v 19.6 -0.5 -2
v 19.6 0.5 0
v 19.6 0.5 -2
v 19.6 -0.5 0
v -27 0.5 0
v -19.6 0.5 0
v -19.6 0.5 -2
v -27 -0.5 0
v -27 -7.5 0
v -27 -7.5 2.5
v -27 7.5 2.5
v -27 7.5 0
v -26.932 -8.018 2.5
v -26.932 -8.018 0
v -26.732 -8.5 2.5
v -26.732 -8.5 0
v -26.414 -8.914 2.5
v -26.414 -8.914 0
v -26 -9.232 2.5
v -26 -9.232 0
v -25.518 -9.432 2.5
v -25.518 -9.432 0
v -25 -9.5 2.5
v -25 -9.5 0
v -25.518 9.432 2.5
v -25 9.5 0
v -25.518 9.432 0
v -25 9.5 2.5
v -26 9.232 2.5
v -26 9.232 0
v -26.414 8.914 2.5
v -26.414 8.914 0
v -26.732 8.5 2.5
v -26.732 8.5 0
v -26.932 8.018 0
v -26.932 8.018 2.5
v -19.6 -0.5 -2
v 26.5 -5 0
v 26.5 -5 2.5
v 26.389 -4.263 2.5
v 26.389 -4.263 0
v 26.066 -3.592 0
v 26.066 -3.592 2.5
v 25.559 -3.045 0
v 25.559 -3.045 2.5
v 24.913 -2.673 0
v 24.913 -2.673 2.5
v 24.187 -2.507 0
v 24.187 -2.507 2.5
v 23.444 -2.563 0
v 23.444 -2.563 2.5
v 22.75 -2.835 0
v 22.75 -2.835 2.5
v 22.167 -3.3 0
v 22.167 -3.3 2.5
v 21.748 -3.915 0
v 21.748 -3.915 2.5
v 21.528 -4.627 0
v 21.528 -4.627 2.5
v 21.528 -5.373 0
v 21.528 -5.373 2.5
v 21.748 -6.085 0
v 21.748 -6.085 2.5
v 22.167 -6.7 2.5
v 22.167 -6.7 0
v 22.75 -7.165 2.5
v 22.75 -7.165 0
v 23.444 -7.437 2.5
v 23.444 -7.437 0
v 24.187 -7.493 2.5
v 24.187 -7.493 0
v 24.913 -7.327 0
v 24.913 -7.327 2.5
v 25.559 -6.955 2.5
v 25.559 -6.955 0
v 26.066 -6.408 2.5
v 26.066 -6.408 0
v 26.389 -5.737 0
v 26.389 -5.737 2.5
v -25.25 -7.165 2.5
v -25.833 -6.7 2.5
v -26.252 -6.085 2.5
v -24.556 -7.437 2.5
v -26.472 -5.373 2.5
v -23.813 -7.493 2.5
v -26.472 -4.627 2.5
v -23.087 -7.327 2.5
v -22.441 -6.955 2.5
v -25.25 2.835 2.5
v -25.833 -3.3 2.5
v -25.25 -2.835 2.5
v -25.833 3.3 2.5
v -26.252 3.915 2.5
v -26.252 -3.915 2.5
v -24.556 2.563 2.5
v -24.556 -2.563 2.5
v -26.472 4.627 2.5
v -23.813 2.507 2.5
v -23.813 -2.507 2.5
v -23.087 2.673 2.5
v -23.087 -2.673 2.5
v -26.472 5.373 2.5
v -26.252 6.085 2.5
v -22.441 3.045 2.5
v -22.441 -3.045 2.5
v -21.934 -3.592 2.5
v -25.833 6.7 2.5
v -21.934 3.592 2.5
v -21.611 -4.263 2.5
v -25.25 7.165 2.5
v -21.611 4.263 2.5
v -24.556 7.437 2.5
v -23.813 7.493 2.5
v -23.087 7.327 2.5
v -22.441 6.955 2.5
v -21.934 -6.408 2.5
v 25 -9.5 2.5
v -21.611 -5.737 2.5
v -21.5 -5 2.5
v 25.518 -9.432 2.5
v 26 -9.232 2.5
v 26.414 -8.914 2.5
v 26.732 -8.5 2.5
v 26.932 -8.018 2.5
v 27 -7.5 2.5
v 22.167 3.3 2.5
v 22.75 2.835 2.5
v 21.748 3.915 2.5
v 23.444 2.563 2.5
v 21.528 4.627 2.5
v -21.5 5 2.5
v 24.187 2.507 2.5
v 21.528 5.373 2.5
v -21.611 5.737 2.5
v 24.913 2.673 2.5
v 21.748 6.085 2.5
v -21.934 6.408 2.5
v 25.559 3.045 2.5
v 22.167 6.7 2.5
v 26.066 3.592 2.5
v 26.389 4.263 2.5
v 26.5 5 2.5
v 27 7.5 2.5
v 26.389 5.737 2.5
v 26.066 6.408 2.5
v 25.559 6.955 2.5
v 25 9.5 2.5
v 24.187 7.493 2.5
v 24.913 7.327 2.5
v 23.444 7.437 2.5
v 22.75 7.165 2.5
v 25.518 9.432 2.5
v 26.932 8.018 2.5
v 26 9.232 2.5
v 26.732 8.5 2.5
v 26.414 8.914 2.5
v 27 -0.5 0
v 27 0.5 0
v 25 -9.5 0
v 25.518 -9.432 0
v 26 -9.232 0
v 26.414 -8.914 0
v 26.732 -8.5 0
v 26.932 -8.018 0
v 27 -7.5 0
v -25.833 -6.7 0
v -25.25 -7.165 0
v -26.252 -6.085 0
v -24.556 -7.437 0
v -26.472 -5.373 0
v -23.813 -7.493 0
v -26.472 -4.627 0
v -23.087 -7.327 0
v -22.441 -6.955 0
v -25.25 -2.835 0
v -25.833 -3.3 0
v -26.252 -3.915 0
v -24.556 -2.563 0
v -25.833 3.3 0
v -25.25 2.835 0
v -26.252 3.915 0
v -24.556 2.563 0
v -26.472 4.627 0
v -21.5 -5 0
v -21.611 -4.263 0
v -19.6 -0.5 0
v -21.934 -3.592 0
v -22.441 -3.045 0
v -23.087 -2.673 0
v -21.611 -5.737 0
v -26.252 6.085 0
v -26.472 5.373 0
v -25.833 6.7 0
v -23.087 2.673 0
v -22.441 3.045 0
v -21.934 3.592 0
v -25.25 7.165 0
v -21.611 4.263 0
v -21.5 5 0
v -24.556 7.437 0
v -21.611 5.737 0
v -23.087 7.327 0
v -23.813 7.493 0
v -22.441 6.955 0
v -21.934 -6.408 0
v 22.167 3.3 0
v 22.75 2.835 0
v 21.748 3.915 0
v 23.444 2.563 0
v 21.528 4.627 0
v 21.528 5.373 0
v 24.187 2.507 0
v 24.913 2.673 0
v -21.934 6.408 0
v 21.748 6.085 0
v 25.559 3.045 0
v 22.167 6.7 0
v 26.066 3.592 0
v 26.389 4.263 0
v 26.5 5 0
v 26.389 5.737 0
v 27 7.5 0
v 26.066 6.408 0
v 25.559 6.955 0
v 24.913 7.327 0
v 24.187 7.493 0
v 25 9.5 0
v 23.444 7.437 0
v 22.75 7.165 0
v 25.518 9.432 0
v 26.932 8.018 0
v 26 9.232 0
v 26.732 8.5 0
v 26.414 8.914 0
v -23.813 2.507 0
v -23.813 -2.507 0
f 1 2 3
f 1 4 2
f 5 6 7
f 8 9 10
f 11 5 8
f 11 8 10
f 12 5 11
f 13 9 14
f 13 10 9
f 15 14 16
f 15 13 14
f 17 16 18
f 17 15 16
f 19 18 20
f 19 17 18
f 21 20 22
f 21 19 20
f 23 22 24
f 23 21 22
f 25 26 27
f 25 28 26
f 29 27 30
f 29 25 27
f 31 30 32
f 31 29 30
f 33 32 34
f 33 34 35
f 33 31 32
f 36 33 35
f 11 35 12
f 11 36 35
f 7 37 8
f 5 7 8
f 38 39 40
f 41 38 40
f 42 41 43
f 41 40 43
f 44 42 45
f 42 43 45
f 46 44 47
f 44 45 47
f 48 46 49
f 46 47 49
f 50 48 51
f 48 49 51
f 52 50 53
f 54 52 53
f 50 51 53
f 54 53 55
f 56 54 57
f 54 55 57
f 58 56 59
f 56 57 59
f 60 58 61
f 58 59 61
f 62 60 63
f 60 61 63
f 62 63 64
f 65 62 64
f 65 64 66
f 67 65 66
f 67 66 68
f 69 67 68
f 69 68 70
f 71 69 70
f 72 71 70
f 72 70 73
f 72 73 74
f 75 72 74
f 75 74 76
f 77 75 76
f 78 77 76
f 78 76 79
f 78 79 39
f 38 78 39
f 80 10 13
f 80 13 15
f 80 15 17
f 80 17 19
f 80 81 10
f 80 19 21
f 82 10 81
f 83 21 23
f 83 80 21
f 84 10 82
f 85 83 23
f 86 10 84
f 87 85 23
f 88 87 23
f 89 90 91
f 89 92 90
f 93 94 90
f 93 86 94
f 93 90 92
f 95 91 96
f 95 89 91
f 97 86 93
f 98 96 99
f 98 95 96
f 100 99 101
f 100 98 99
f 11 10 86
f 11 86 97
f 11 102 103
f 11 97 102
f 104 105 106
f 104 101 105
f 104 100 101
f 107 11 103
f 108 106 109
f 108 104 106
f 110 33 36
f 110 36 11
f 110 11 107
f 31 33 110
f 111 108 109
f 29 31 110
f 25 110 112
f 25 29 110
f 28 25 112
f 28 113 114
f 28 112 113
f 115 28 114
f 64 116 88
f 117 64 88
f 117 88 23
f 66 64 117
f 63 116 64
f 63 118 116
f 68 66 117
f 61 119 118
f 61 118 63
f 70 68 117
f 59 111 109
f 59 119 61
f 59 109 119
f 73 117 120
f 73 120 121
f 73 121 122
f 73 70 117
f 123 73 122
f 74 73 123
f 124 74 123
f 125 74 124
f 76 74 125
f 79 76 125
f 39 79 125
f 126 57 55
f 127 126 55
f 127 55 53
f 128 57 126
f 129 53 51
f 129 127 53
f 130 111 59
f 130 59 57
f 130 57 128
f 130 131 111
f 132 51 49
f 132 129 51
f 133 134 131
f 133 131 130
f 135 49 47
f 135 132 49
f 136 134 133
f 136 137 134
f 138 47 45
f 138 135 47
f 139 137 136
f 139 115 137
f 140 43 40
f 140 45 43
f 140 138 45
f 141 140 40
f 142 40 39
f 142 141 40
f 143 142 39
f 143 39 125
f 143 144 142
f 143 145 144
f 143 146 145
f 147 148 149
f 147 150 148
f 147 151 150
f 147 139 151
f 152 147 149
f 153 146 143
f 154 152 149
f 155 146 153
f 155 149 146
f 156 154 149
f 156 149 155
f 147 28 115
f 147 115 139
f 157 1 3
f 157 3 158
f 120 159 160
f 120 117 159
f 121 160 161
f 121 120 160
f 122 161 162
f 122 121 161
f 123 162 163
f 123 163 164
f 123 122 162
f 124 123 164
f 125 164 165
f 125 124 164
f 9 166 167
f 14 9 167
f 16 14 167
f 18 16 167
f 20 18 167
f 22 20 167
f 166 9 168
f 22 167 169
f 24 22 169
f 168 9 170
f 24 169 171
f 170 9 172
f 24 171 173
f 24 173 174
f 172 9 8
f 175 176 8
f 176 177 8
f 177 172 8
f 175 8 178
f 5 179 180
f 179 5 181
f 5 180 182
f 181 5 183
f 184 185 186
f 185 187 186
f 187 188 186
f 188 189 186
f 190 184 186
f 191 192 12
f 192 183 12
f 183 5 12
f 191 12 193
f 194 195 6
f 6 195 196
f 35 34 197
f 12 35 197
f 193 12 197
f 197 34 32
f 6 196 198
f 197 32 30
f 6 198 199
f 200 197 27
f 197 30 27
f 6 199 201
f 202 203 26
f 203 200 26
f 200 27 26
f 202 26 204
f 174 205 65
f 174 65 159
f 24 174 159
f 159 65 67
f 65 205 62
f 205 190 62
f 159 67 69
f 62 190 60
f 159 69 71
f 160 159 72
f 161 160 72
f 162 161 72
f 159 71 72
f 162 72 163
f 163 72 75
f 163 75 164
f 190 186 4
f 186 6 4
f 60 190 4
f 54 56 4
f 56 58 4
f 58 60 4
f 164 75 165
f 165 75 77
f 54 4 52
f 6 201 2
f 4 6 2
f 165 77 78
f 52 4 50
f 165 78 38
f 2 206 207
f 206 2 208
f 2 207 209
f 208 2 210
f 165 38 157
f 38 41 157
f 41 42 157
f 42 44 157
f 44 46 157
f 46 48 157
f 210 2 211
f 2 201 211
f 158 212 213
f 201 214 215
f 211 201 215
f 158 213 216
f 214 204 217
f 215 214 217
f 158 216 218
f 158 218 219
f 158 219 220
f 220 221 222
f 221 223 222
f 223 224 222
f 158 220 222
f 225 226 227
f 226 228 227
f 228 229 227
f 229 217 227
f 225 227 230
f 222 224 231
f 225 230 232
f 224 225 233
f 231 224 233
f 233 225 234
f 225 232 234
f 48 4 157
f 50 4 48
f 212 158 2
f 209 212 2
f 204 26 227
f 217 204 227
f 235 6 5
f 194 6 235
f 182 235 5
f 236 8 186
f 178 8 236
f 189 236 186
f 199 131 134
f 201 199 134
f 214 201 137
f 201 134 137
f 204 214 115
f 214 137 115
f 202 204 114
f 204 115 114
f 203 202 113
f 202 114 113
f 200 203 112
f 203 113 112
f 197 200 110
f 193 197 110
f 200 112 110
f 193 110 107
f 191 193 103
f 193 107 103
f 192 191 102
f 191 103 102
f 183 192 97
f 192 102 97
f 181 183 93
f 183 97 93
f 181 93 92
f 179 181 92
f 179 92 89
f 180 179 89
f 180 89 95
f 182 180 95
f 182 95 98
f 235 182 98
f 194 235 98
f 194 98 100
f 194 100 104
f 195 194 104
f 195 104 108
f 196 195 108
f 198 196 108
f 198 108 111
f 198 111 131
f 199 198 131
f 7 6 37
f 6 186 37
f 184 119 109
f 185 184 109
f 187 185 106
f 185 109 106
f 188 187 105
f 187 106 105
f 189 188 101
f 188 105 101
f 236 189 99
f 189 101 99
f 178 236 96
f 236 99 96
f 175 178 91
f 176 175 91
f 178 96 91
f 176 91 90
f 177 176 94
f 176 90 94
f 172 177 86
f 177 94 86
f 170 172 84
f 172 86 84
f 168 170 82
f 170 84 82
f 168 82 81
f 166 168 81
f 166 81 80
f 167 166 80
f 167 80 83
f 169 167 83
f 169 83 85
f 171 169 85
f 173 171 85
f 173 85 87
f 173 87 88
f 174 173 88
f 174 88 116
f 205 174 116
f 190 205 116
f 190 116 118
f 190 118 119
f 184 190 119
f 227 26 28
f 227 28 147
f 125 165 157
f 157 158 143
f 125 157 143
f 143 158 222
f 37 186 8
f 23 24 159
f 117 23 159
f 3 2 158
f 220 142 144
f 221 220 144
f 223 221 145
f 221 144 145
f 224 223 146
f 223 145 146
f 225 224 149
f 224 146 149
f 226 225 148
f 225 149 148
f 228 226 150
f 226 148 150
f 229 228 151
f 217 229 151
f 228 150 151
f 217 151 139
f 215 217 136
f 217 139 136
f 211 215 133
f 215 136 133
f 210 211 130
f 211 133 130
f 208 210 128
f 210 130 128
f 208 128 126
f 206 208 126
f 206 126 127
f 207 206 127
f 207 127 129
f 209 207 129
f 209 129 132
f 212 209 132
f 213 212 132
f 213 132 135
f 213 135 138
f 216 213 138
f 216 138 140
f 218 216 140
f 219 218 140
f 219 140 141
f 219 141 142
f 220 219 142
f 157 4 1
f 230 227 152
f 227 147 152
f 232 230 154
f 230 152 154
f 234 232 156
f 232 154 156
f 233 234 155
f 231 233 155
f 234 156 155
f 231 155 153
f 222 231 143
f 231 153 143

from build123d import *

# Parameters (mm, degrees)
SKETCH008_W     = 54
SKETCH008_H     = 19
PAD006_DEPTH    = 2.5
SKETCH009_R     = 2.5
POCKET002_DEPTH = 2.501
FILLET007_R     = 2
FILLET008_R     = 2
FILLET009_R     = 2
FILLET010_R     = 2
PAD007_DEPTH    = 0.5


with BuildPart() as part:
    # Sketch008 → Pad006 (new body)
    with BuildSketch(Plane.XY):
        Rectangle(SKETCH008_W, SKETCH008_H)
    extrude(amount=PAD006_DEPTH)

    # Sketch009 (on Face6 of Pad006) → Pocket002 (cut, through all)
    with BuildSketch(Plane.XY.offset(2.5)):
        with Locations((-24, 5)):
            Circle(SKETCH009_R)
        with Locations((24, 5)):
            Circle(SKETCH009_R)
        with Locations((24, -5)):
            Circle(SKETCH009_R)
        with Locations((-24, -5)):
            Circle(SKETCH009_R)
    extrude(amount=-POCKET002_DEPTH, mode=Mode.SUBTRACT)

    # Fillet007
    fillet007_edges = [part.edges().sort_by_distance(p)[0] for p in [
        (27, 9.5, 1.25),
    ]]
    fillet(fillet007_edges, radius=FILLET007_R)

    # Fillet008
    fillet008_edges = [part.edges().sort_by_distance(p)[0] for p in [
        (-27, 9.5, 1.25),
    ]]
    fillet(fillet008_edges, radius=FILLET008_R)

    # Fillet009
    fillet009_edges = [part.edges().sort_by_distance(p)[0] for p in [
        (-27, -9.5, 1.25),
    ]]
    fillet(fillet009_edges, radius=FILLET009_R)

    # Fillet010
    fillet010_edges = [part.edges().sort_by_distance(p)[0] for p in [
        (27, -9.5, 1.25),
    ]]
    fillet(fillet010_edges, radius=FILLET010_R)

    # Sketch010 → Pad007 (join, symmetric)
    with BuildSketch(Plane.XZ):
        Polygon((-27, 0), (-19.6, 0), (-19.6, -2), align=None)
    pad007 = extrude(amount=PAD007_DEPTH, both=True)

    # Mirrored: Pad007 across Sketch010 V_Axis
    add(pad007.mirror(Plane(origin=(0, 0, 0), x_dir=(0, -1, 0), z_dir=(1, 0, 0))))


solid = part.part
